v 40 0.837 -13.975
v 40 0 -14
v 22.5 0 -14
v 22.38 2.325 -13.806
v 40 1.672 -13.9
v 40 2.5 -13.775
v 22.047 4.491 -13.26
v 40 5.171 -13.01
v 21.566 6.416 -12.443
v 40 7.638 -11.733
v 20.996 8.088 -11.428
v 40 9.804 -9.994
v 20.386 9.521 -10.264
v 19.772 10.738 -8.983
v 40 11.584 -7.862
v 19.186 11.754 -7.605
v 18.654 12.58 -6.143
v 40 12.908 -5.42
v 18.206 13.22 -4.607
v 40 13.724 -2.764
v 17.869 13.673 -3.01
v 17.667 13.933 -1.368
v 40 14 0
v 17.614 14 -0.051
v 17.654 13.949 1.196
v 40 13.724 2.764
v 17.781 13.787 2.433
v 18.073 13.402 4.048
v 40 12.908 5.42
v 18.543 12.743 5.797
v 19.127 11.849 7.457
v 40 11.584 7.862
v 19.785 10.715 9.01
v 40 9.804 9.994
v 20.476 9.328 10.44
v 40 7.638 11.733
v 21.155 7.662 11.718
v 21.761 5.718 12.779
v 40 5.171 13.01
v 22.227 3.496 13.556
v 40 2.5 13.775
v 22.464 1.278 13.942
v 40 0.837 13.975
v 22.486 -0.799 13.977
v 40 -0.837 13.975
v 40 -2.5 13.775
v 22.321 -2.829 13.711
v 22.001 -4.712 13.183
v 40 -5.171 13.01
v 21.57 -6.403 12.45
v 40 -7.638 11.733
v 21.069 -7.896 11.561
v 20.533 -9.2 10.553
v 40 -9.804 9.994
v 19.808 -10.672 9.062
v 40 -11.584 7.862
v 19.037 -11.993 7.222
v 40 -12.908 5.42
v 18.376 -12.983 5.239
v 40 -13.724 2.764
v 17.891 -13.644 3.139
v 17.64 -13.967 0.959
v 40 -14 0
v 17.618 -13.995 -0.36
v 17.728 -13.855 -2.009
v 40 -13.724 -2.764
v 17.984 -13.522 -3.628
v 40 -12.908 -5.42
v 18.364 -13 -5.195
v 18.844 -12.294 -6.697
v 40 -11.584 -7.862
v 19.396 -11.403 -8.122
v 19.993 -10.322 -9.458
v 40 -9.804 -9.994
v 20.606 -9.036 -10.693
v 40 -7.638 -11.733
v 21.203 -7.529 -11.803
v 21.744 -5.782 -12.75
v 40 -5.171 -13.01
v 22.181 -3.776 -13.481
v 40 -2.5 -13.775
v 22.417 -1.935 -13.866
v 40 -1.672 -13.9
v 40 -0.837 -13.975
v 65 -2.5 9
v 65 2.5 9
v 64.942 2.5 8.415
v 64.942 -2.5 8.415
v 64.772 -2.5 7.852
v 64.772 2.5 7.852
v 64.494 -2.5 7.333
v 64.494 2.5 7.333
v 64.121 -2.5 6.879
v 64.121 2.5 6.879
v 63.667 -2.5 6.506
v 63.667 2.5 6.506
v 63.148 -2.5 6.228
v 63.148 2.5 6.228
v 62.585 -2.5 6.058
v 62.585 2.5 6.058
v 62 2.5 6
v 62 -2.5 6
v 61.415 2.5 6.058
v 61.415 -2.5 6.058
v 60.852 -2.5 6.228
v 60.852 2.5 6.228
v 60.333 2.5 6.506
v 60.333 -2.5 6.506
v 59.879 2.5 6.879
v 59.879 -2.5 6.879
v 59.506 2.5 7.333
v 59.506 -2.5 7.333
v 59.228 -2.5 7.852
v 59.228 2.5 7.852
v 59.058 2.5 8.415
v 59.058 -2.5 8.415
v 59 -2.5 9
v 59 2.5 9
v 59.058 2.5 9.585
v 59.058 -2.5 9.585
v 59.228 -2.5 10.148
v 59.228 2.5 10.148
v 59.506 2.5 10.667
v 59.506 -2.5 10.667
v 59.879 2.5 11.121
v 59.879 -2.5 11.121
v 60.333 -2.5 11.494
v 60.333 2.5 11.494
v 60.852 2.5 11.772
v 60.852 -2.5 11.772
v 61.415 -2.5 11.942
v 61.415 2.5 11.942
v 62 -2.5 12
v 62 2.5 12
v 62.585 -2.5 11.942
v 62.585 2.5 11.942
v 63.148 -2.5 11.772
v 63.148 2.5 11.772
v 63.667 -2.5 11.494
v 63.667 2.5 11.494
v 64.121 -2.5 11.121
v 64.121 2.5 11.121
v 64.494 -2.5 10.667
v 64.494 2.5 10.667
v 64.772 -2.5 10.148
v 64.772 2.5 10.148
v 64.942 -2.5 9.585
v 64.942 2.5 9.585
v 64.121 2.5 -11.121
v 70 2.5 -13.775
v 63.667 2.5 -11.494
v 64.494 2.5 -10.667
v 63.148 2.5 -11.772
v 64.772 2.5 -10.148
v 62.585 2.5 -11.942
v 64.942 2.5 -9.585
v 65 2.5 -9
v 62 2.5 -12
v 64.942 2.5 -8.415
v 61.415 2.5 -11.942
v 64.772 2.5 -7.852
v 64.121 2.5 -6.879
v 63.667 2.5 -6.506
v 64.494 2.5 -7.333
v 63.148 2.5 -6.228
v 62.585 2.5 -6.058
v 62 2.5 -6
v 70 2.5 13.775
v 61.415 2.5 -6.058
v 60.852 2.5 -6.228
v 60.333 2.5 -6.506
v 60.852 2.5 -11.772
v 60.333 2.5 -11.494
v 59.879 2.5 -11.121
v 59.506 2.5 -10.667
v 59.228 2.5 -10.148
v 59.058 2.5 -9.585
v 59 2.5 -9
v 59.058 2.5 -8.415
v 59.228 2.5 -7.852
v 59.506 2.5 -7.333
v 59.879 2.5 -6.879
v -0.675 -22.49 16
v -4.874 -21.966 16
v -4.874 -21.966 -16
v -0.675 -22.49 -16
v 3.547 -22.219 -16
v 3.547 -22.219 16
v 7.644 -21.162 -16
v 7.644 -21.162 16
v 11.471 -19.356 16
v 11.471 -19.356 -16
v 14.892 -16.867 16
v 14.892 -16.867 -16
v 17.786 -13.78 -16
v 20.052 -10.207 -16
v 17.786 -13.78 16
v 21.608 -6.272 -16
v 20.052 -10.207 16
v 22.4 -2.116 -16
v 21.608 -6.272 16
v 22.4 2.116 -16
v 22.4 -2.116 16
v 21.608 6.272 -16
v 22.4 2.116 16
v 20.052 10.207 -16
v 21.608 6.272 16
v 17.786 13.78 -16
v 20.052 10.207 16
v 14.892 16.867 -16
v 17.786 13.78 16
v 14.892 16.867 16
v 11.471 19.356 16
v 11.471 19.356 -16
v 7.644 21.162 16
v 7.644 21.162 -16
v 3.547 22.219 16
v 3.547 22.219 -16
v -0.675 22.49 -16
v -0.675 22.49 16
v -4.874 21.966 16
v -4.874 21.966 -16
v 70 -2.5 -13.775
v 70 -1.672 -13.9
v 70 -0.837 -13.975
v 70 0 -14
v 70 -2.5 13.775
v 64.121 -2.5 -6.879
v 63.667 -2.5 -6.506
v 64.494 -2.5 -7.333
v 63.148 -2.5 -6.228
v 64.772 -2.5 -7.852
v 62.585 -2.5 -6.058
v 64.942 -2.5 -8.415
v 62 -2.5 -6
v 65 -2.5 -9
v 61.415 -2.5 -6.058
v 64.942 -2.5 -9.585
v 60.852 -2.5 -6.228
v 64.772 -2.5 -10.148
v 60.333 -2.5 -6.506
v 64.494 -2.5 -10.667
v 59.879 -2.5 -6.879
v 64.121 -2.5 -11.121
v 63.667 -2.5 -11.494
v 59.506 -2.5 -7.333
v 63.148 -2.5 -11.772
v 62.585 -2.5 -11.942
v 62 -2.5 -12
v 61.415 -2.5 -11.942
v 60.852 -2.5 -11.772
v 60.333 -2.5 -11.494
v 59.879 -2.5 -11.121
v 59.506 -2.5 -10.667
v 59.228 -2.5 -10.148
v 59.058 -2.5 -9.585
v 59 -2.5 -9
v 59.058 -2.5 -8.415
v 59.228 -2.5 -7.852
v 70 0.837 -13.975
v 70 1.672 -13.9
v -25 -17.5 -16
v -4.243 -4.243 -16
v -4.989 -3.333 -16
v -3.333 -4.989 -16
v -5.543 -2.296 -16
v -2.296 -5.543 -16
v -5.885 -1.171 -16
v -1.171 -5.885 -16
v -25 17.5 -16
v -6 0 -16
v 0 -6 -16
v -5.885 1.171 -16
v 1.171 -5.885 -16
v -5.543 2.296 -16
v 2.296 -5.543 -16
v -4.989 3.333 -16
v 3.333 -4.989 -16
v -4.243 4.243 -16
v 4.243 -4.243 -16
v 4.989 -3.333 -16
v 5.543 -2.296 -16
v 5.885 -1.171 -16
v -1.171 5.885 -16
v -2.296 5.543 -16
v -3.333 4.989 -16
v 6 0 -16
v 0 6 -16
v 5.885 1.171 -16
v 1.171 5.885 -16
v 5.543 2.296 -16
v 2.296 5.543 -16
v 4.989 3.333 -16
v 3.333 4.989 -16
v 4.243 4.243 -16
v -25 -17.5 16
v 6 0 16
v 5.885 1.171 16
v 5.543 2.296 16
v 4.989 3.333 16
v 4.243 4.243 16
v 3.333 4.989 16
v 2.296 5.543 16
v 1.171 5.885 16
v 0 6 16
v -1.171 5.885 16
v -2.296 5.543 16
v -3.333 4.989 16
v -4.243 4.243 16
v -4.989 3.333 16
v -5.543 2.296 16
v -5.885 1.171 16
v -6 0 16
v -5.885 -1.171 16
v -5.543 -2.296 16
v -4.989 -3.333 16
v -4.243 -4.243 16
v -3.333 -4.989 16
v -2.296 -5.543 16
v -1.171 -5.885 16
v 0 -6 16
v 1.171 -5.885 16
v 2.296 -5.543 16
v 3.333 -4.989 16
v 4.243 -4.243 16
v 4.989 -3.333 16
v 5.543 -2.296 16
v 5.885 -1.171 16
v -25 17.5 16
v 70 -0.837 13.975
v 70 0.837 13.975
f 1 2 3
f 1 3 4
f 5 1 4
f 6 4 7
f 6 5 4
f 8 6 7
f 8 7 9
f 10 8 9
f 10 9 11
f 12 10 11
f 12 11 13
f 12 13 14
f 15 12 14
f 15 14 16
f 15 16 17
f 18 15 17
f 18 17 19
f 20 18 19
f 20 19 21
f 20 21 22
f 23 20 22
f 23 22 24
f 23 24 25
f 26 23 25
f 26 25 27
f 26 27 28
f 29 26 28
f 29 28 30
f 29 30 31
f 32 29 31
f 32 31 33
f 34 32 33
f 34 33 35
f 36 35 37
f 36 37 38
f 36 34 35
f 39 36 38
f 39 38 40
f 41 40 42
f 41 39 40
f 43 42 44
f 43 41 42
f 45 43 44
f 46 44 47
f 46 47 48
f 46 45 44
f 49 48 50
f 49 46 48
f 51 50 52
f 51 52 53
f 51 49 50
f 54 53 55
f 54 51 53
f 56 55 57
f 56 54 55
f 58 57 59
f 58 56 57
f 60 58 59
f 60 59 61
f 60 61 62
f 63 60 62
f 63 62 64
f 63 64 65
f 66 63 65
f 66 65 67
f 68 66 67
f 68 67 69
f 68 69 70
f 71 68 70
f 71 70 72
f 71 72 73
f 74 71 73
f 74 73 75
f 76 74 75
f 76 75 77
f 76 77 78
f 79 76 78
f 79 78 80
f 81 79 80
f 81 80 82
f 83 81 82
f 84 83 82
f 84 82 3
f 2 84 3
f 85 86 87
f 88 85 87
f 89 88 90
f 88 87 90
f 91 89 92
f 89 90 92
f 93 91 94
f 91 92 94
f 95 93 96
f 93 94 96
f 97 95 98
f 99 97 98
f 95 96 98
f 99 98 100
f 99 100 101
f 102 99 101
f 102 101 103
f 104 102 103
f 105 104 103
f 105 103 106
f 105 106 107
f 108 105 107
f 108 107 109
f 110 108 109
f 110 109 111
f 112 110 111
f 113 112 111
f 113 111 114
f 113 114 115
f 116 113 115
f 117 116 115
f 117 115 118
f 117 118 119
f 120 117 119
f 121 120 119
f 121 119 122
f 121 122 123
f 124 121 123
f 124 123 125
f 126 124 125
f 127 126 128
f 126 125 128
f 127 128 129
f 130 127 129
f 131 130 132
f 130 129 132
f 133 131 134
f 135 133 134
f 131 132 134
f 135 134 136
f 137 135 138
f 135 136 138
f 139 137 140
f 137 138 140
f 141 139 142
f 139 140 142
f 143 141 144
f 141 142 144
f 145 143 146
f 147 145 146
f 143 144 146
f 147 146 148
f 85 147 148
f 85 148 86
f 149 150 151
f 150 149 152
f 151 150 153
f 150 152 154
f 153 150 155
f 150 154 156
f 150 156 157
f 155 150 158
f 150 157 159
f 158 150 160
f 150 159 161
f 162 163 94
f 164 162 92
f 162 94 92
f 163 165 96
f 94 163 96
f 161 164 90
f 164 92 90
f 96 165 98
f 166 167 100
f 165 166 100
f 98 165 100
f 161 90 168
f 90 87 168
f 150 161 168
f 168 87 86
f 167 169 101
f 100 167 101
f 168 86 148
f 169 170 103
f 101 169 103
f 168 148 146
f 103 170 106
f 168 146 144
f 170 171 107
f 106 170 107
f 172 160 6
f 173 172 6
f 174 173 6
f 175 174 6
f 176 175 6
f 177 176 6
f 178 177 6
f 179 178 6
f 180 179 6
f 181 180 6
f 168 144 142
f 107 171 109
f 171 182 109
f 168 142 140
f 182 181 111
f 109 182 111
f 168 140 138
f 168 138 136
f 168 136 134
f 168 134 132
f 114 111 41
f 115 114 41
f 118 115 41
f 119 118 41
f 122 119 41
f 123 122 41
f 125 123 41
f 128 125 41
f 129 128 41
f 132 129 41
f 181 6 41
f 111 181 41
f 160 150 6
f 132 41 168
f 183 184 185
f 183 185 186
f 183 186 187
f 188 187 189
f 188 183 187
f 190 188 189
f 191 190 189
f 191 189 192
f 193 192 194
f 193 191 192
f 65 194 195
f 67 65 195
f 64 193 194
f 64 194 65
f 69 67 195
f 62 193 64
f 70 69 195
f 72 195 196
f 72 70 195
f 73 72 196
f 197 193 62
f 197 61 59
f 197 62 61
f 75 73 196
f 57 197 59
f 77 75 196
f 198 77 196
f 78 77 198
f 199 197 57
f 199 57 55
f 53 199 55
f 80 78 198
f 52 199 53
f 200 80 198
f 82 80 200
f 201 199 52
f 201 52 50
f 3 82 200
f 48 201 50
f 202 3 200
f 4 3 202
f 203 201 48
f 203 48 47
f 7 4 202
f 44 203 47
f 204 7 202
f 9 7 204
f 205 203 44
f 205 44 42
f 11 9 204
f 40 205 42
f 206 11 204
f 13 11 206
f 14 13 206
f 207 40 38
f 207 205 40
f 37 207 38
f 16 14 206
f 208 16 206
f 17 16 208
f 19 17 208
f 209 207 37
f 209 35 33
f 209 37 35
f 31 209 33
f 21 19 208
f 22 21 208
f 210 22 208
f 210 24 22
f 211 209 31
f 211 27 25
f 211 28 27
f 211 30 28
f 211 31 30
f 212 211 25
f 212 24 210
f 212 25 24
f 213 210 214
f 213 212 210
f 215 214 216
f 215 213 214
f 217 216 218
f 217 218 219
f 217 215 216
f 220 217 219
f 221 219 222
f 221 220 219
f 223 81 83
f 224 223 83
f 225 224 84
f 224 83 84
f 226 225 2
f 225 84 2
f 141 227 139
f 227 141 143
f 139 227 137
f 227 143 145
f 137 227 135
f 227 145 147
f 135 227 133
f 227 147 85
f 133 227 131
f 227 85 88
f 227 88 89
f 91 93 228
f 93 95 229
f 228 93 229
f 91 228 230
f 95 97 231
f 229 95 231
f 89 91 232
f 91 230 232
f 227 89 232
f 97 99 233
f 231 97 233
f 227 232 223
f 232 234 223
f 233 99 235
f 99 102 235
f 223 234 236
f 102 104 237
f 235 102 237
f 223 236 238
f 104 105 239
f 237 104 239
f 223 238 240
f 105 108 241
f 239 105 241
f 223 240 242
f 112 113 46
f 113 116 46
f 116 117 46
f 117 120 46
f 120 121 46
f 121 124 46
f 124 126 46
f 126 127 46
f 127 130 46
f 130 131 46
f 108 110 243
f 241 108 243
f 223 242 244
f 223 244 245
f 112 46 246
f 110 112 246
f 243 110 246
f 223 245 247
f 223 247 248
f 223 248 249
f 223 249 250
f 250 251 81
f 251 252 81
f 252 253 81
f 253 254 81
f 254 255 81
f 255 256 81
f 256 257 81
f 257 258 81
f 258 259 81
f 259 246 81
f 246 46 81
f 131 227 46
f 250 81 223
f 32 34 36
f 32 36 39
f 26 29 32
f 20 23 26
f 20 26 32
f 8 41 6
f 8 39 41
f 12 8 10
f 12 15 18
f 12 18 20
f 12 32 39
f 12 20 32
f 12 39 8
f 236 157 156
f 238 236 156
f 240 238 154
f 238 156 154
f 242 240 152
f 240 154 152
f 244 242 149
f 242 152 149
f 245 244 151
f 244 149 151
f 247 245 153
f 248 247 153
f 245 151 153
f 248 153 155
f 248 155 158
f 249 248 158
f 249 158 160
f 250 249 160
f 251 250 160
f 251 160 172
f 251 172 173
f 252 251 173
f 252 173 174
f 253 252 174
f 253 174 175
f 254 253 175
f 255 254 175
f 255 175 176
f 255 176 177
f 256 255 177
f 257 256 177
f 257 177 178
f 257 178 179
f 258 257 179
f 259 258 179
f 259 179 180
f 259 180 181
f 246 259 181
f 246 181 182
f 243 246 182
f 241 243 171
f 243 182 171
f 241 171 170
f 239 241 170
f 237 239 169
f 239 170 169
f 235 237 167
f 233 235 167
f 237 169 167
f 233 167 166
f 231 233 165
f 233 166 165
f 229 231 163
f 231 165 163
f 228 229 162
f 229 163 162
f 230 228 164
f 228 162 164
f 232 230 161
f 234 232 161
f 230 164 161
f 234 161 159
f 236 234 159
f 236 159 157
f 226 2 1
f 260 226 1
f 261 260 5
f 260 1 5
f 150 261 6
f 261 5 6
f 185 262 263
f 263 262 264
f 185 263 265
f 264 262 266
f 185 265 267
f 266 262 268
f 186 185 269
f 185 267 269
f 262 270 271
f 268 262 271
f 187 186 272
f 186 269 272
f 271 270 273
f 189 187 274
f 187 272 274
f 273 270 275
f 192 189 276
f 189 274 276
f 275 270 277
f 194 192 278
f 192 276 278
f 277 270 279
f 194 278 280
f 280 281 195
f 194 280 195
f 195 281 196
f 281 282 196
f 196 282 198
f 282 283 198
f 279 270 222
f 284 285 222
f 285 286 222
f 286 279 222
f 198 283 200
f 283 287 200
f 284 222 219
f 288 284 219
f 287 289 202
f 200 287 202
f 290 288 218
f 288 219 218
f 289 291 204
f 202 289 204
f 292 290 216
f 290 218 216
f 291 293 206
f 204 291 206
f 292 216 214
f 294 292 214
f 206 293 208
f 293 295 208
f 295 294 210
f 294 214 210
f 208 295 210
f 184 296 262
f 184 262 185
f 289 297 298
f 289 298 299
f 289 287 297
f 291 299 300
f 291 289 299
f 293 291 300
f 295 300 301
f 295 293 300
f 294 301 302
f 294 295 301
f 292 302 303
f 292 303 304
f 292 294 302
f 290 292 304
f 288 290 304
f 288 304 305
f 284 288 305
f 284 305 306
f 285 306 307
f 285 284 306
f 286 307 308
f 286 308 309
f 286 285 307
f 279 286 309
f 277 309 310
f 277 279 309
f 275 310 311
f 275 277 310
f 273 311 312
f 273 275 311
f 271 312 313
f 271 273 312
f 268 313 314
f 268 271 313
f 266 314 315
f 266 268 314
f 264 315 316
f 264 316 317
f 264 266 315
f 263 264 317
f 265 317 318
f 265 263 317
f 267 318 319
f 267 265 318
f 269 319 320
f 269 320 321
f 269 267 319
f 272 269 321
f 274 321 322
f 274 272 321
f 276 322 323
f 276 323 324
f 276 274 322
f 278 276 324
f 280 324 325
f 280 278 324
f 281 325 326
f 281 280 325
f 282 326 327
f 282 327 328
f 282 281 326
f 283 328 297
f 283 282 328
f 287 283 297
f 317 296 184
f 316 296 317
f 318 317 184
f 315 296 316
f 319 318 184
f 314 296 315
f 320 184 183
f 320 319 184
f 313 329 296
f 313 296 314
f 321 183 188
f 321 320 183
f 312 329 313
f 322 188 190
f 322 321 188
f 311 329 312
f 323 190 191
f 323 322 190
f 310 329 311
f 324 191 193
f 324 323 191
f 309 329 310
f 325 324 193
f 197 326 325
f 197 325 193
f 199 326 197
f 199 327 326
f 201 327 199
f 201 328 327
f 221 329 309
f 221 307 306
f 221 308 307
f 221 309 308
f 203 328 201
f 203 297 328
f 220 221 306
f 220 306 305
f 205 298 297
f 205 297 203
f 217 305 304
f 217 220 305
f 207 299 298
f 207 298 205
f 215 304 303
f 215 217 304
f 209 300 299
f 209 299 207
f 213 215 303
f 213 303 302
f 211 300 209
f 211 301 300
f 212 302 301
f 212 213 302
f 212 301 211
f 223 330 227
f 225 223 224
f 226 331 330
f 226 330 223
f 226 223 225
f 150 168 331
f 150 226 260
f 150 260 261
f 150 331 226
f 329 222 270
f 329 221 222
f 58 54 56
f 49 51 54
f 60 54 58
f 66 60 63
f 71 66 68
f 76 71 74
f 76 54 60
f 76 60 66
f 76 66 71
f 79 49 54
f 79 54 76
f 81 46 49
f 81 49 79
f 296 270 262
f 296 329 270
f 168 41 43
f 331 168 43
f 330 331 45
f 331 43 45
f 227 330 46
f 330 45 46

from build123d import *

# Parameters (mm, degrees)
IZIM1_R                     = 6
Y_KSEKLIK_EKSTR_ZYON1_DEPTH = 16
Y_KSEKLIK_EKSTR_ZYON2_REACH = 67
IZIM2_R                     = 14
Y_KSEKLIK_EKSTR_ZYON3_DEPTH = 30
IZIM4_R                     = 3
KES_EKSTR_ZYON1_DEPTH       = 30


with BuildPart() as part:
    # Çizim1 → Yükseklik-Ekstrüzyon1 (new body, symmetric)
    with BuildSketch(Plane.XY):
        with BuildLine():
            Line((-25, 17.5), (-25, -17.5))
            Line((-25, -17.5), (-4.873971328, -21.965755245))
            ThreePointArc((-4.873971328, -21.965755245), (22.5, 0), (-4.873971328, 21.965755245))
            Line((-4.873971328, 21.965755245), (-25, 17.5))
        make_face()
        Circle(IZIM1_R, mode=Mode.SUBTRACT)
    extrude(amount=Y_KSEKLIK_EKSTR_ZYON1_DEPTH, both=True)

    # Çizim2 → Yükseklik-Ekstrüzyon2 (add, up to next)
    with BuildSketch(Plane(origin=(40, 0, 0), x_dir=(0, 0, -1), z_dir=(1, 0, 0)), mode=Mode.PRIVATE) as y_kseklik_ekstr_zyon2_sk1:
        Circle(IZIM2_R)
    y_kseklik_ekstr_zyon2_tool1 = extrude(y_kseklik_ekstr_zyon2_sk1.sketch, amount=-Y_KSEKLIK_EKSTR_ZYON2_REACH, mode=Mode.PRIVATE) - part.part
    add(y_kseklik_ekstr_zyon2_tool1.solids().sort_by_distance((40, 0, 0))[0])

    # Çizim3 → Yükseklik-Ekstrüzyon3 (add)
    with BuildSketch(Plane(origin=(40, 0, 0), x_dir=(0, 0, -1), z_dir=(1, 0, 0))):
        with BuildLine():
            ThreePointArc((-13.774977314, 2.5), (-14, 0), (-13.774977314, -2.5))
            Line((-13.774977314, -2.5), (13.774977314, -2.5))
            ThreePointArc((13.774977314, -2.5), (13.943630847, -1.255053307), (14, 0))
            ThreePointArc((14, 0), (13.943630847, 1.255053307), (13.774977314, 2.5))
            Line((13.774977314, 2.5), (-13.774977314, 2.5))
        make_face()
    extrude(amount=Y_KSEKLIK_EKSTR_ZYON3_DEPTH)

    # Çizim4 → Kes-Ekstrüzyon1 (cut)
    with BuildSketch(Plane(origin=(0, 2.5, 0), x_dir=(1, 0, 0), z_dir=(0, 1, 0))):
        with Locations((62, -9)):
            Circle(IZIM4_R)
        with Locations((62, 9)):
            Circle(IZIM4_R)
    extrude(amount=-KES_EKSTR_ZYON1_DEPTH, mode=Mode.SUBTRACT)


solid = part.part
